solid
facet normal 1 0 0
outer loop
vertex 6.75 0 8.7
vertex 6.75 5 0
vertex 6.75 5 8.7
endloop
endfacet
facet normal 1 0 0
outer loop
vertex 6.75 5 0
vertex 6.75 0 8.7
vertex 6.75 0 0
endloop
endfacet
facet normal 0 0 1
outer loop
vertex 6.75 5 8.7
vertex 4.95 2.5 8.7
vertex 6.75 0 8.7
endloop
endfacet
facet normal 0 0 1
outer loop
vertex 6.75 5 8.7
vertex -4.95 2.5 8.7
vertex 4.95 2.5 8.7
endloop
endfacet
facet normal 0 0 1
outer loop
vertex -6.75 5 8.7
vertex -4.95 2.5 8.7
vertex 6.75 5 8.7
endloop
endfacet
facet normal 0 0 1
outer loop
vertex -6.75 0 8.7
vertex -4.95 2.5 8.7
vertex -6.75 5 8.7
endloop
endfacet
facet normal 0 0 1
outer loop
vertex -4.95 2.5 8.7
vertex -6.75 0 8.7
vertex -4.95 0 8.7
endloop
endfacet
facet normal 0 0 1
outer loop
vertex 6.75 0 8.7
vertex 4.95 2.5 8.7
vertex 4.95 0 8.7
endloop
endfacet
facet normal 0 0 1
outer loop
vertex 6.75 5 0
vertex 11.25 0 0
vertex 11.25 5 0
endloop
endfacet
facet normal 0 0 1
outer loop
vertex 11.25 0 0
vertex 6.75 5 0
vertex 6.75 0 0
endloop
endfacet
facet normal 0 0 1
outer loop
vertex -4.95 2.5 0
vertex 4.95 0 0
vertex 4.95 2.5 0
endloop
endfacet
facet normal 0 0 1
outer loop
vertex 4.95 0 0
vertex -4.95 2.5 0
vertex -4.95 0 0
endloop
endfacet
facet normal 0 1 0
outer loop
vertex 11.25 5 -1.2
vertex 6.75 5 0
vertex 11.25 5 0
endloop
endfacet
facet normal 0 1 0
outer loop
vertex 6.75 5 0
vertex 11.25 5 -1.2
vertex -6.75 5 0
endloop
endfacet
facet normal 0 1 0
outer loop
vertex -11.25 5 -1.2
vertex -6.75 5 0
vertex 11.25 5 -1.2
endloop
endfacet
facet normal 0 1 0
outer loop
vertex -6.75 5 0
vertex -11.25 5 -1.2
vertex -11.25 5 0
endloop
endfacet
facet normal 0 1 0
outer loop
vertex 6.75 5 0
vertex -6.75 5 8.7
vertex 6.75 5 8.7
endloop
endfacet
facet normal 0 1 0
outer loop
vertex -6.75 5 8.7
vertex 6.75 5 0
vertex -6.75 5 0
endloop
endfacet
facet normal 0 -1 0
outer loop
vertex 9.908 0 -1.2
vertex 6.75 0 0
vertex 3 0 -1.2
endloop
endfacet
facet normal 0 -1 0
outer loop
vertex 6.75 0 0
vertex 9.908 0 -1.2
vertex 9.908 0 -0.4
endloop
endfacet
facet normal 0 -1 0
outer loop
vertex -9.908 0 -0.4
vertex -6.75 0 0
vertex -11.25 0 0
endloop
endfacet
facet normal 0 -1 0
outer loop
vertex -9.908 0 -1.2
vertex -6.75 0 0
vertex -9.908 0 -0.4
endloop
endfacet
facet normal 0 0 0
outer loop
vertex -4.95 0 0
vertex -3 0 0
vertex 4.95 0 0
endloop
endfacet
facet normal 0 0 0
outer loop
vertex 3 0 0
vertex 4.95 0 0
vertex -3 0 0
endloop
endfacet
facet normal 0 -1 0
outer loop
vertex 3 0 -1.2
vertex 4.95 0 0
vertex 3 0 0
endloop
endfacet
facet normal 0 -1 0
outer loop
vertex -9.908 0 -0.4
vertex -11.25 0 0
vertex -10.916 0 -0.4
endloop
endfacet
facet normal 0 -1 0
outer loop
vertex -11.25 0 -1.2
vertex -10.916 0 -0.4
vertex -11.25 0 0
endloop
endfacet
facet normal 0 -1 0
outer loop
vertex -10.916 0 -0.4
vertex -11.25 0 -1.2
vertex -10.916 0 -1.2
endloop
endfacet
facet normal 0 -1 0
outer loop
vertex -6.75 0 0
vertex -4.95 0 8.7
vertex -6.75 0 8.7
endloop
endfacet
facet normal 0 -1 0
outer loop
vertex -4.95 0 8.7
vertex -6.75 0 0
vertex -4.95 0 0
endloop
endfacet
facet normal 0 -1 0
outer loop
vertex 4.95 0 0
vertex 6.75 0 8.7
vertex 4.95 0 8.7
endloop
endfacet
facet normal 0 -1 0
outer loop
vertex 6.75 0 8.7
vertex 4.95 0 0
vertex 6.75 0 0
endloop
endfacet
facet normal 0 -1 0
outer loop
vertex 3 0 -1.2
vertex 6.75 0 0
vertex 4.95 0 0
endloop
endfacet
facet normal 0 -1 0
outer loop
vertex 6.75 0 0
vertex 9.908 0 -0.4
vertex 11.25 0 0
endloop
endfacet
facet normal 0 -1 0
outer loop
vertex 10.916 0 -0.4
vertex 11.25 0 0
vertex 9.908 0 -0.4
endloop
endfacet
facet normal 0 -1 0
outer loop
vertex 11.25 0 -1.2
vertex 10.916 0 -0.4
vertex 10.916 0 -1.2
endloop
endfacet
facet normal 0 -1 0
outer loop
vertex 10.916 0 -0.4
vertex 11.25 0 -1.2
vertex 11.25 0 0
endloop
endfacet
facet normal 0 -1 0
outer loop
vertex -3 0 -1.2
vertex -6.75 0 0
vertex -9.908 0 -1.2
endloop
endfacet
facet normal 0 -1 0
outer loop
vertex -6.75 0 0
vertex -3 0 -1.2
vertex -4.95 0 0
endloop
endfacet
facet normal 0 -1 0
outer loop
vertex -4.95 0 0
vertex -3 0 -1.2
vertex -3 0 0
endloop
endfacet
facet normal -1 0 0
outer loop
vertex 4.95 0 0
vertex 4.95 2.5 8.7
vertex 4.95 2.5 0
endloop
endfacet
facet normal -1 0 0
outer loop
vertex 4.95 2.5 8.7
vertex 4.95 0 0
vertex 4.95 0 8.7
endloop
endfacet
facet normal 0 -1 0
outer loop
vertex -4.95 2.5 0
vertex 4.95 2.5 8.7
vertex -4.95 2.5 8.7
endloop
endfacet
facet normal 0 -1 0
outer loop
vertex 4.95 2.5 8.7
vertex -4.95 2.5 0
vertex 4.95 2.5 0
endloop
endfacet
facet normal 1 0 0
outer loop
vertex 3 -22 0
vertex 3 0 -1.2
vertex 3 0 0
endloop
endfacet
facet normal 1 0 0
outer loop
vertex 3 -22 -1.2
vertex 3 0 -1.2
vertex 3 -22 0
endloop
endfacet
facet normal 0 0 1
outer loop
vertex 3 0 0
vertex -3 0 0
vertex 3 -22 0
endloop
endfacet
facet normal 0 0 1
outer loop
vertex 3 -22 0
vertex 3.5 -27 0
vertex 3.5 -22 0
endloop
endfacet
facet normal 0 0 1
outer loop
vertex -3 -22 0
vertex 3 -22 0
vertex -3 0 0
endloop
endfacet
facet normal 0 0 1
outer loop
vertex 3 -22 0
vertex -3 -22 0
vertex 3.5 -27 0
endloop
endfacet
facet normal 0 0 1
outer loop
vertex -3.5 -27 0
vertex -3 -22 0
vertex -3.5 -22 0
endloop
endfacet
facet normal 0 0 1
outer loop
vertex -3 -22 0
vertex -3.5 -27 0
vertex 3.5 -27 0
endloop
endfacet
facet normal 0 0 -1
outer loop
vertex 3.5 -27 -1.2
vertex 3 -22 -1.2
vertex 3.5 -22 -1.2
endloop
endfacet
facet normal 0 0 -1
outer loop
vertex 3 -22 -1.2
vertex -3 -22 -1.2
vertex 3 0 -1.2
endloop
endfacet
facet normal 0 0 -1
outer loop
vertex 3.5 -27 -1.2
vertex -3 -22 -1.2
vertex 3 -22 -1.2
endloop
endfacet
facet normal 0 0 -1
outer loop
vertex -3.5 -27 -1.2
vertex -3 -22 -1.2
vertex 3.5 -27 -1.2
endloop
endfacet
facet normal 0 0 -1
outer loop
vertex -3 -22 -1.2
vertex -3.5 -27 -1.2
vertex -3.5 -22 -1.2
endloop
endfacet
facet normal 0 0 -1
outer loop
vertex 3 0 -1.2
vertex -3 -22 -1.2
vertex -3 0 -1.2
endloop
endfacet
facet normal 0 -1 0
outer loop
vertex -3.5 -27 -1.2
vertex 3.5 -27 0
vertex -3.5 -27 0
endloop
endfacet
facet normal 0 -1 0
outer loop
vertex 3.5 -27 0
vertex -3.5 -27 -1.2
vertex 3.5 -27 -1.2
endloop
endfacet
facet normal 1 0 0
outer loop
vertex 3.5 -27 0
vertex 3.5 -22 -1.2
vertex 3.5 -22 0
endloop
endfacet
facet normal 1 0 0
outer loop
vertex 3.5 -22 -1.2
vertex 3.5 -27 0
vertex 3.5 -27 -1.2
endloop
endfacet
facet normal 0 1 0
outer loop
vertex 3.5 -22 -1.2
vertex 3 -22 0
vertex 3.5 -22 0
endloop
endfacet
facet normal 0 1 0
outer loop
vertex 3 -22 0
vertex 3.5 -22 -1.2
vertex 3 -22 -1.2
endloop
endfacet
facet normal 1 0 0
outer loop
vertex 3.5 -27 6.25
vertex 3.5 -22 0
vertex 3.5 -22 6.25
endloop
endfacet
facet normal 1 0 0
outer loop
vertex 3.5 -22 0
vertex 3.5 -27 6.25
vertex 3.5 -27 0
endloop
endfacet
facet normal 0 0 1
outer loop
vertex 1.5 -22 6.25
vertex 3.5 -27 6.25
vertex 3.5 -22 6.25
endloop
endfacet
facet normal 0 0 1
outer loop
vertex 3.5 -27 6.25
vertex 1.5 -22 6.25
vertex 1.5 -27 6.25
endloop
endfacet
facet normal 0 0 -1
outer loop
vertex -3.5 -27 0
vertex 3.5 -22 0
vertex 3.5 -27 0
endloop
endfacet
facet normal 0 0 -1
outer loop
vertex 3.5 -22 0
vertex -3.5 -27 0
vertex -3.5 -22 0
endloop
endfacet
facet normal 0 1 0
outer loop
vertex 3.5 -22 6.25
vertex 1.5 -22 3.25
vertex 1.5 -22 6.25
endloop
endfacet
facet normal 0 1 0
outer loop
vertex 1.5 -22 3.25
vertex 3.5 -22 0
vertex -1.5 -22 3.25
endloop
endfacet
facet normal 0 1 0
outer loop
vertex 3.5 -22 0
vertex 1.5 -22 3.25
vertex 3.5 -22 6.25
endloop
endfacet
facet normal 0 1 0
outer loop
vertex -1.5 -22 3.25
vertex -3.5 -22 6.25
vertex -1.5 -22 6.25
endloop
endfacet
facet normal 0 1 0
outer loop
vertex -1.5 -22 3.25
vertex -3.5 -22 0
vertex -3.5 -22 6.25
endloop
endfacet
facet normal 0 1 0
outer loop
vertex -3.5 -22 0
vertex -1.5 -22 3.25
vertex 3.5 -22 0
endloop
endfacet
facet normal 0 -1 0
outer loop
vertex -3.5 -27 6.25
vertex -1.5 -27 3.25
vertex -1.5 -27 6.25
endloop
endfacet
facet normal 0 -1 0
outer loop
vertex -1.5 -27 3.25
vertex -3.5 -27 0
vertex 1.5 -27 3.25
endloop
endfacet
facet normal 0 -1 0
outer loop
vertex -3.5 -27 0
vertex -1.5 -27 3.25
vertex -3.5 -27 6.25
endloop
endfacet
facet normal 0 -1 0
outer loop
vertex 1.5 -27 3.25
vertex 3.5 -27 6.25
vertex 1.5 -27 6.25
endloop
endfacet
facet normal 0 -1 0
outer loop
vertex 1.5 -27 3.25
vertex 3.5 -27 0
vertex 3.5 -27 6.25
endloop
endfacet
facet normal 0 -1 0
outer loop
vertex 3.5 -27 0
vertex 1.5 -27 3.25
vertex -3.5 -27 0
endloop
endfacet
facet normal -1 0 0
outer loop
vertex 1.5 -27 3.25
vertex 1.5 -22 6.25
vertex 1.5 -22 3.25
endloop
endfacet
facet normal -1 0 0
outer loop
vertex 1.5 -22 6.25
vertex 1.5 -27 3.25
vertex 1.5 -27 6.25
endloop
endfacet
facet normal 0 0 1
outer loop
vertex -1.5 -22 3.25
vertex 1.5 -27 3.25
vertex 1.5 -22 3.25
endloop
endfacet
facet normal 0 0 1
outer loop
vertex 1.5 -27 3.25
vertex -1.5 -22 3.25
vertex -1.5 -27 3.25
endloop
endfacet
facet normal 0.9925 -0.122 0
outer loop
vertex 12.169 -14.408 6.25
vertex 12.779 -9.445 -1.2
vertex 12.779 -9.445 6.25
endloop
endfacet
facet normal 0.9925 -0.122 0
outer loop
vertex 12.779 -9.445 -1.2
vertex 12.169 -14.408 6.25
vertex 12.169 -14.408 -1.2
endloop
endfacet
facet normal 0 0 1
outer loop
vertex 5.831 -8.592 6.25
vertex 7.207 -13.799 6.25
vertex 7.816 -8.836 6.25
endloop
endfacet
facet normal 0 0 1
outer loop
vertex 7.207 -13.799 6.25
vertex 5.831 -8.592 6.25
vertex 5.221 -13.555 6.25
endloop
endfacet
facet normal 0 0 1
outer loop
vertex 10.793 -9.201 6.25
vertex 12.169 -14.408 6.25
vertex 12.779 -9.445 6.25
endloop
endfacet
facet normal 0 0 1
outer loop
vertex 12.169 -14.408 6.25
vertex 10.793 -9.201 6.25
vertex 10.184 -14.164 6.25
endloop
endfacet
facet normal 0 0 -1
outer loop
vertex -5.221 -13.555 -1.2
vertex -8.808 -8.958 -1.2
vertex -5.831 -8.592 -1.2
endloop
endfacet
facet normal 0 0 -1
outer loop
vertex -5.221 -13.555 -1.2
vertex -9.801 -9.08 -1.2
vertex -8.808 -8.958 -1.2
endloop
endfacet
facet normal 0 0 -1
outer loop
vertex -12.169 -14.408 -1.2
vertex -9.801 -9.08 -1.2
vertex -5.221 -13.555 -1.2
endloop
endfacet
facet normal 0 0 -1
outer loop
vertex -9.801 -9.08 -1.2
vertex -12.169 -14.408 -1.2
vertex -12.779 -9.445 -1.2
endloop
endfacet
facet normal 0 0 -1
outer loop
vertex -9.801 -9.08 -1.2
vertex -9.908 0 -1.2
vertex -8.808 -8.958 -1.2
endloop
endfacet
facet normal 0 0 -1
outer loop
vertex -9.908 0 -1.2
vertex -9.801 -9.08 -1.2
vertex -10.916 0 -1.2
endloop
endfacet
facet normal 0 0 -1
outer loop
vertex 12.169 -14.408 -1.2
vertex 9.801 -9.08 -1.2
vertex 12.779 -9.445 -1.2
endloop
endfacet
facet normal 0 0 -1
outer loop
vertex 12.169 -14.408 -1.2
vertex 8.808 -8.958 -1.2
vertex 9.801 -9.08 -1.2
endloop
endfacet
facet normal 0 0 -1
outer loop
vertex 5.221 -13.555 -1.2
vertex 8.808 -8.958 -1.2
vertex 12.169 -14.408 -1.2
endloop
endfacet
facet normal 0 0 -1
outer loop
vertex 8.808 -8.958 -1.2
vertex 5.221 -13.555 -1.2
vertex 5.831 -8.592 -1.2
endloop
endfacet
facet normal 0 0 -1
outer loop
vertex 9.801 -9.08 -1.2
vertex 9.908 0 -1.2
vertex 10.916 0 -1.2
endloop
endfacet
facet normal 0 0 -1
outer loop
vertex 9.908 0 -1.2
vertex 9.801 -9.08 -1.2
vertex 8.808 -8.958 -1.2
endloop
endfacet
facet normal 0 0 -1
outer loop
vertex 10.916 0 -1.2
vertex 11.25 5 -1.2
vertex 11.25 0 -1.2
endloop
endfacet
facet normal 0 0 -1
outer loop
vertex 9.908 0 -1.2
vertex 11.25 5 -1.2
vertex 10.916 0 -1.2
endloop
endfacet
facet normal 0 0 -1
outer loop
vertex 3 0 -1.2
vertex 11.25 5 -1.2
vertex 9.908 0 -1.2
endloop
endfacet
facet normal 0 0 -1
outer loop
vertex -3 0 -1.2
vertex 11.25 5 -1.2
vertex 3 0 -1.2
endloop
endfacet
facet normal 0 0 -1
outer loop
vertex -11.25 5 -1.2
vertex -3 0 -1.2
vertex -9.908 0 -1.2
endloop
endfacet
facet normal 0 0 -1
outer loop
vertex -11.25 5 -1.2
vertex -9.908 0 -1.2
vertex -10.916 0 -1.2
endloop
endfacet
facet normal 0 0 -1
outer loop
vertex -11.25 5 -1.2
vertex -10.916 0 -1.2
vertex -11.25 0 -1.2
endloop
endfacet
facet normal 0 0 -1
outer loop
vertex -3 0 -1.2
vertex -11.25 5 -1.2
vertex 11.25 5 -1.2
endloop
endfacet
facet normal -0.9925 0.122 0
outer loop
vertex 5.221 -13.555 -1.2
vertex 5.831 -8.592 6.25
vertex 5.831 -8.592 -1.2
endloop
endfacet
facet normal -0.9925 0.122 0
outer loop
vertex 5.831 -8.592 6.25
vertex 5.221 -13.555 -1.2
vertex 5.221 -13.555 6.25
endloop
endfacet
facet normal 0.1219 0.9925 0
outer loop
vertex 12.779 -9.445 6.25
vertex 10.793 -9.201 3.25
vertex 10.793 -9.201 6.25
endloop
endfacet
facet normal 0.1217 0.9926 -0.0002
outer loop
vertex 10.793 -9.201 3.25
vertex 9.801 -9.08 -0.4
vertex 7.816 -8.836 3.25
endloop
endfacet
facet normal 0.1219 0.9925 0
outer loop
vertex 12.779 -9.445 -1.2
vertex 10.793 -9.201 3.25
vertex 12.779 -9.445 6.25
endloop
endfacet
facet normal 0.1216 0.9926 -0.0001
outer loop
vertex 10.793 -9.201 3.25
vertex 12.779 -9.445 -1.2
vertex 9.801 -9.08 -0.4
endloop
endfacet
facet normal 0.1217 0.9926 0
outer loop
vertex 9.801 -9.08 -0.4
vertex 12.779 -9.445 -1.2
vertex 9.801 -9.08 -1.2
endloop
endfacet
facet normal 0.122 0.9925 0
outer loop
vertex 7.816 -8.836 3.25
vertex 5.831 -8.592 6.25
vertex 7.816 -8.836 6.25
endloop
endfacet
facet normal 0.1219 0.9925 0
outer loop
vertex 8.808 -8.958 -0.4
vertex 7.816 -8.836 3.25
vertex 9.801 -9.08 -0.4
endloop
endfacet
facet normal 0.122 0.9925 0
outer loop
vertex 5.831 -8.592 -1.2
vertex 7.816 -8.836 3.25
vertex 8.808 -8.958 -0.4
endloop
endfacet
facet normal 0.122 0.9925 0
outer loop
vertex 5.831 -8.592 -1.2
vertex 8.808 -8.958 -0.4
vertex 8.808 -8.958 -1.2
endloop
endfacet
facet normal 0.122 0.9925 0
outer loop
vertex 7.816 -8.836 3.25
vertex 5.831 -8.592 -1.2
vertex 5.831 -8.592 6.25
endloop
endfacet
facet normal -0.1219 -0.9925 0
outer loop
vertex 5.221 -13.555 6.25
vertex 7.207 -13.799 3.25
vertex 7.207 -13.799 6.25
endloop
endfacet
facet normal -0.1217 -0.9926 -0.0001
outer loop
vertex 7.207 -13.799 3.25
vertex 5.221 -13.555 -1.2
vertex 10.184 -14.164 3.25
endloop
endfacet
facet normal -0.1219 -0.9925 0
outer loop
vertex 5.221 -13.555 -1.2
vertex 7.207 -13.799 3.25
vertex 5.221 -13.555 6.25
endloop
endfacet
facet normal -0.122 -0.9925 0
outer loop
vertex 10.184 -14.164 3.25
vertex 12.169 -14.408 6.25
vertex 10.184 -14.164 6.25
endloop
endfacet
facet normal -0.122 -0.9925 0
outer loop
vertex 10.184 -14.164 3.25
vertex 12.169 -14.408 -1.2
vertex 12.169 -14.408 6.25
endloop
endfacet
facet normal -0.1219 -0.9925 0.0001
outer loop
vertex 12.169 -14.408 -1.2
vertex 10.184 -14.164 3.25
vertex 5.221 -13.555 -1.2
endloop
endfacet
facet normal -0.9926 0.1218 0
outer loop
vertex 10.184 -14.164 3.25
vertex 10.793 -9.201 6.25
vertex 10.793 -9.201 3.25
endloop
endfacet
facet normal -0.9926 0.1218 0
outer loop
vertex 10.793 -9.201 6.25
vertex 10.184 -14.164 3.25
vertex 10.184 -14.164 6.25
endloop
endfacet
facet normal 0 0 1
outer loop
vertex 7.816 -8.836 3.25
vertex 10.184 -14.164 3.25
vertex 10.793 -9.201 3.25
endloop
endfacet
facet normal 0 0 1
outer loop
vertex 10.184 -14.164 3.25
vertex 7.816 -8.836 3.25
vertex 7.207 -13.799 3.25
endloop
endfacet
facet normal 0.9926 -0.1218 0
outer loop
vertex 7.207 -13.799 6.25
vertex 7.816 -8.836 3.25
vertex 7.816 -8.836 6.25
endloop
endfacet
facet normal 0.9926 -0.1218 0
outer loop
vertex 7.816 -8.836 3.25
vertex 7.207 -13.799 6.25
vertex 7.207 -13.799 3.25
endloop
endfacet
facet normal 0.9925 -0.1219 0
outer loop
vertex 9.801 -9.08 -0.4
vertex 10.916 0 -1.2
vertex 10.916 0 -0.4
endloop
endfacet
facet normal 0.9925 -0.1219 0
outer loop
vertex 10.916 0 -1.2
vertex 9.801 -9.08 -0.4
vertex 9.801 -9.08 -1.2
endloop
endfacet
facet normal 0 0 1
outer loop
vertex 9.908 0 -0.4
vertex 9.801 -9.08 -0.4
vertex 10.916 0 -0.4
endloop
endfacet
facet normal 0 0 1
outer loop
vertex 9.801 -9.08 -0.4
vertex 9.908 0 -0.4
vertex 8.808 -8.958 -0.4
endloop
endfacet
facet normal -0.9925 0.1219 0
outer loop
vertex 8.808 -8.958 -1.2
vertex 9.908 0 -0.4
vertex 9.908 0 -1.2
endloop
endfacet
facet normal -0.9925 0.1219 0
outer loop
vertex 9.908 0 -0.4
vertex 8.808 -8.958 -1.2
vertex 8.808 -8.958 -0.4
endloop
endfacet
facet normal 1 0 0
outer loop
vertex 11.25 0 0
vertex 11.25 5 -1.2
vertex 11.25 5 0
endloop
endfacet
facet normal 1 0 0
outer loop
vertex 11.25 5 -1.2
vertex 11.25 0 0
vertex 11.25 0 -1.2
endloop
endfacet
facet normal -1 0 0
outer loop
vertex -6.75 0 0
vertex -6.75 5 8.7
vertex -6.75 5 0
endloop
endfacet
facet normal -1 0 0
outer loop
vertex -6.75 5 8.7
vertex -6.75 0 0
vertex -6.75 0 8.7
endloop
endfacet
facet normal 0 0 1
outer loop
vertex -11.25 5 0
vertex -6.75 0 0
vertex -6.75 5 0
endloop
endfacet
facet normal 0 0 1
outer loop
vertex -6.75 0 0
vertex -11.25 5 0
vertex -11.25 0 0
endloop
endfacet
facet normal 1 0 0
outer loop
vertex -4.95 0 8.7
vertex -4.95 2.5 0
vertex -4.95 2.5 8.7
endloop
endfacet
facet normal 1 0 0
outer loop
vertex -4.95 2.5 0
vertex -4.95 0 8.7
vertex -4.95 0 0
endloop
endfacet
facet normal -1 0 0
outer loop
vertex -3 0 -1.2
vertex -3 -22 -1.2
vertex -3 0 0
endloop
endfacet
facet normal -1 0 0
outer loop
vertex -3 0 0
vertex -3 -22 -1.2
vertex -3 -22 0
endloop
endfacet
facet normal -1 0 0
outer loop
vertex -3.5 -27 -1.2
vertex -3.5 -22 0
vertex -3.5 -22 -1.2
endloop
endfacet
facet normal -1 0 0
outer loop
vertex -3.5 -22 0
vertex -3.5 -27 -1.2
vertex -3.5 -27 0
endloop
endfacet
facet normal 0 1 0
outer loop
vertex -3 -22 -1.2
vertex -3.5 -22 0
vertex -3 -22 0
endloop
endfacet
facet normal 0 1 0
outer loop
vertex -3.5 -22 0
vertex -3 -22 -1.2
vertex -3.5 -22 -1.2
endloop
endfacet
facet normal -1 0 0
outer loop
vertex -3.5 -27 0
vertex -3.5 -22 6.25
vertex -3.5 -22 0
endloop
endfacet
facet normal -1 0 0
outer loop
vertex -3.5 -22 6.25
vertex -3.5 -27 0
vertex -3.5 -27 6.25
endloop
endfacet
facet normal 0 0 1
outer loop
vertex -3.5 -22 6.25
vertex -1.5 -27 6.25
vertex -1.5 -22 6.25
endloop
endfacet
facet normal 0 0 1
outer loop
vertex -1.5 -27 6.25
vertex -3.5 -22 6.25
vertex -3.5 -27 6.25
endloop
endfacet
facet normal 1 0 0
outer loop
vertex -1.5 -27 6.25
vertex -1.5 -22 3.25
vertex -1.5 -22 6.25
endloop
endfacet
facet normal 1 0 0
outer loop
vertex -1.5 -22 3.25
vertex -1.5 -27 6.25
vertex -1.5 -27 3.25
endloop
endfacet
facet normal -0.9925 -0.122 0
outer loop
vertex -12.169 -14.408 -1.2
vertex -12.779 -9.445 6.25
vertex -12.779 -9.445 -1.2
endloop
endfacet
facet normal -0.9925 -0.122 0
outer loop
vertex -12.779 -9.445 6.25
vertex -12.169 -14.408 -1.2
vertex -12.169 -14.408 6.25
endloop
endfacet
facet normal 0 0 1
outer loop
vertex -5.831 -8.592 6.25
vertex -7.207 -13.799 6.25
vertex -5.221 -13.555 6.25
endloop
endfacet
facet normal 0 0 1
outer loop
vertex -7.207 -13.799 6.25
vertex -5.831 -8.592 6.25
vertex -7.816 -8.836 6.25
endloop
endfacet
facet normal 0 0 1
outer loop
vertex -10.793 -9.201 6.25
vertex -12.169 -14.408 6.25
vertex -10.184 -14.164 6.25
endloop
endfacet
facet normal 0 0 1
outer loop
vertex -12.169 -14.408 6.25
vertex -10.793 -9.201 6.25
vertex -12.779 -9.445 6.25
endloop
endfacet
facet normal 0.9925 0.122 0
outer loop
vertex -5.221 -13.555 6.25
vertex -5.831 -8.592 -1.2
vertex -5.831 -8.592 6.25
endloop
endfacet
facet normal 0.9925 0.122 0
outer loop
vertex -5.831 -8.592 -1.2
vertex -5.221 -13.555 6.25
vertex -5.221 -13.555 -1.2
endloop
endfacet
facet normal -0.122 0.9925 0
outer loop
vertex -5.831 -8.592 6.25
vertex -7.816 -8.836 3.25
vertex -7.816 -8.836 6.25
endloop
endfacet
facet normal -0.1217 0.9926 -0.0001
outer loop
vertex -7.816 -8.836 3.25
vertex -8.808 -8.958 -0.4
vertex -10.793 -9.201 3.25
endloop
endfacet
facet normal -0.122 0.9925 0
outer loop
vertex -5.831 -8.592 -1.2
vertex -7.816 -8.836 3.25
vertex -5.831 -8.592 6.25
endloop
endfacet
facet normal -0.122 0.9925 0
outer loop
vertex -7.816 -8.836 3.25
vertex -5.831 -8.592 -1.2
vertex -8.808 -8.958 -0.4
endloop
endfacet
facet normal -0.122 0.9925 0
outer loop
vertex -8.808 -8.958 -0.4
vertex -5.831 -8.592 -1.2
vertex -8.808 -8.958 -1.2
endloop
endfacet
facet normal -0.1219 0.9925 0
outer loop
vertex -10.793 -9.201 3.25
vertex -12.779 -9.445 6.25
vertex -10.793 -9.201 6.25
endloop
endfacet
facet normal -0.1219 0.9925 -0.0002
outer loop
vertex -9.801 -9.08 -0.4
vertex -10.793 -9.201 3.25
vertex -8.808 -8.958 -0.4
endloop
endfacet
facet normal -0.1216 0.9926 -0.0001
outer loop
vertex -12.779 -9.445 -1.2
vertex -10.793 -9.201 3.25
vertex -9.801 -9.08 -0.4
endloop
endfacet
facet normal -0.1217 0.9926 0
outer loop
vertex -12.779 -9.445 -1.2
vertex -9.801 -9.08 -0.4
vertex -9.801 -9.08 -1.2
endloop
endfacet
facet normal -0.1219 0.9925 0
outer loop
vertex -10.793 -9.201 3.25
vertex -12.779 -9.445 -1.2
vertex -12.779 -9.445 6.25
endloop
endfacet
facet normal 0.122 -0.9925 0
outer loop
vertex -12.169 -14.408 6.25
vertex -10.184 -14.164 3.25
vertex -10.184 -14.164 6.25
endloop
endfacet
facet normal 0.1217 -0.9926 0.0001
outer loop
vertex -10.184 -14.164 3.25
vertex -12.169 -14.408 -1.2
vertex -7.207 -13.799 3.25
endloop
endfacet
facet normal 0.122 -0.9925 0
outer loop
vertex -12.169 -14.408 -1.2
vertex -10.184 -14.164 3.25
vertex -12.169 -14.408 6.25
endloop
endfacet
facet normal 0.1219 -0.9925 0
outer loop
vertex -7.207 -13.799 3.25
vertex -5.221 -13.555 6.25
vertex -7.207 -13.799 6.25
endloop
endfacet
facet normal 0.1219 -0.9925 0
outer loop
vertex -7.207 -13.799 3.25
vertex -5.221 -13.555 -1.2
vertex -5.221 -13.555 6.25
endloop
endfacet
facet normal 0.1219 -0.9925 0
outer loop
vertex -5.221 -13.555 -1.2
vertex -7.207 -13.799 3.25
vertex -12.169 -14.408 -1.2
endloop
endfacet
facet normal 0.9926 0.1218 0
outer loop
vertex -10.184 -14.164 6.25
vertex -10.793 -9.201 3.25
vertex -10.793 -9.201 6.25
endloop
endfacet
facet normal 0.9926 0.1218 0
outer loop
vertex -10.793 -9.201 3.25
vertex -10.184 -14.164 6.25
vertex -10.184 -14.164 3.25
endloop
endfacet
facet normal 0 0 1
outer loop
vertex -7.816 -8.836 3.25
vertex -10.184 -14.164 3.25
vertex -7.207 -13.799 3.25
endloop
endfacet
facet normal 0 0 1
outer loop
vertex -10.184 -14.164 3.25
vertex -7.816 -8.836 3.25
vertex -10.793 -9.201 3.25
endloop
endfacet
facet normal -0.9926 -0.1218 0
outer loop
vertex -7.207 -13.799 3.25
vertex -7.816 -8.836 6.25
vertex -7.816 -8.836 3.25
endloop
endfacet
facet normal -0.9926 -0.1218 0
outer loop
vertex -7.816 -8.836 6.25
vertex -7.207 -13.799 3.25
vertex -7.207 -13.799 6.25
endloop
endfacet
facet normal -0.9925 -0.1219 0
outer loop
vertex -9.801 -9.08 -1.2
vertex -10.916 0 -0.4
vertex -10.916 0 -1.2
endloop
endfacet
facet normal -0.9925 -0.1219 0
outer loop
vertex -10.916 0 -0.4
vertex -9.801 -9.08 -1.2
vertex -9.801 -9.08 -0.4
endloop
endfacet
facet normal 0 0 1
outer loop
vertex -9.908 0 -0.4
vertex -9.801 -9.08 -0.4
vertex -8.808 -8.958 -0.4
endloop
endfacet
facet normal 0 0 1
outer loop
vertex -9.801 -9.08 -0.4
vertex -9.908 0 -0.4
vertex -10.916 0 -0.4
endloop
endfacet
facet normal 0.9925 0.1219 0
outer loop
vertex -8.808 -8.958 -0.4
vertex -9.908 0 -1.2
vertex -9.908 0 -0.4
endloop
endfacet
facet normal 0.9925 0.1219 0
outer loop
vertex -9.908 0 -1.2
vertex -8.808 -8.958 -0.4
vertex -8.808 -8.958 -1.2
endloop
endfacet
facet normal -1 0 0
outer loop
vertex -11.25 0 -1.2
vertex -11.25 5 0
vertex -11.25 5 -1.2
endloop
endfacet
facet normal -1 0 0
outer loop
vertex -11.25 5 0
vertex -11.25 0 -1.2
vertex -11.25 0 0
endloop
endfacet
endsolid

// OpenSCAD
/* Pole holder centered on the holder */
module poleHolder(radius,headradius,pivotlength)
{
  translate(v=[-radius-2,-2.5,0])
  {
    difference()
    {
      translate(v=[0,0,-1.2])
        cube(size=[2*radius+4,5,headradius+radius+1.2]);
      translate(v=[2,0,headradius-radius])
        cube(size=[2*radius,5,2*radius]);
    }
  }

  translate(v=[-0.5,0,-1.2])
    cube(size=[1.0,pivotlength,0.8]);
}

module halfRelay(radius,headradius)
{
  /* Half a nail head holder */
  difference()
  {
    cube(size=[headradius+2,5,2*headradius-0.8]);

    cube(size=[headradius+0.2,2.5,2*headradius-0.8]);
  }

  translate(v=[0,0,-1.2])
    cube(size=[headradius+6.5,5,1.2]);

  translate(v=[0,-27,-1.2])
  {
    cube(size=[3,27,1.2]);

    cube(size=[3.5,5,1.2]);
  }

  /* Half a nail stem holder */
  translate(v=[0,-27,0])
    difference()
    {
      cube(size=[radius+2,5,headradius+radius]);
      translate(v=[0,0,headradius-radius])
        cube(size=[radius,5,2*radius]);
    }

  translate(v=[9,-11.5,0])
    rotate([0,0,-7.0])
      poleHolder(radius,headradius,13);
}

halfRelay(1.5,4.75);
mirror([1,0,0])
  halfRelay(1.5,4.75);
